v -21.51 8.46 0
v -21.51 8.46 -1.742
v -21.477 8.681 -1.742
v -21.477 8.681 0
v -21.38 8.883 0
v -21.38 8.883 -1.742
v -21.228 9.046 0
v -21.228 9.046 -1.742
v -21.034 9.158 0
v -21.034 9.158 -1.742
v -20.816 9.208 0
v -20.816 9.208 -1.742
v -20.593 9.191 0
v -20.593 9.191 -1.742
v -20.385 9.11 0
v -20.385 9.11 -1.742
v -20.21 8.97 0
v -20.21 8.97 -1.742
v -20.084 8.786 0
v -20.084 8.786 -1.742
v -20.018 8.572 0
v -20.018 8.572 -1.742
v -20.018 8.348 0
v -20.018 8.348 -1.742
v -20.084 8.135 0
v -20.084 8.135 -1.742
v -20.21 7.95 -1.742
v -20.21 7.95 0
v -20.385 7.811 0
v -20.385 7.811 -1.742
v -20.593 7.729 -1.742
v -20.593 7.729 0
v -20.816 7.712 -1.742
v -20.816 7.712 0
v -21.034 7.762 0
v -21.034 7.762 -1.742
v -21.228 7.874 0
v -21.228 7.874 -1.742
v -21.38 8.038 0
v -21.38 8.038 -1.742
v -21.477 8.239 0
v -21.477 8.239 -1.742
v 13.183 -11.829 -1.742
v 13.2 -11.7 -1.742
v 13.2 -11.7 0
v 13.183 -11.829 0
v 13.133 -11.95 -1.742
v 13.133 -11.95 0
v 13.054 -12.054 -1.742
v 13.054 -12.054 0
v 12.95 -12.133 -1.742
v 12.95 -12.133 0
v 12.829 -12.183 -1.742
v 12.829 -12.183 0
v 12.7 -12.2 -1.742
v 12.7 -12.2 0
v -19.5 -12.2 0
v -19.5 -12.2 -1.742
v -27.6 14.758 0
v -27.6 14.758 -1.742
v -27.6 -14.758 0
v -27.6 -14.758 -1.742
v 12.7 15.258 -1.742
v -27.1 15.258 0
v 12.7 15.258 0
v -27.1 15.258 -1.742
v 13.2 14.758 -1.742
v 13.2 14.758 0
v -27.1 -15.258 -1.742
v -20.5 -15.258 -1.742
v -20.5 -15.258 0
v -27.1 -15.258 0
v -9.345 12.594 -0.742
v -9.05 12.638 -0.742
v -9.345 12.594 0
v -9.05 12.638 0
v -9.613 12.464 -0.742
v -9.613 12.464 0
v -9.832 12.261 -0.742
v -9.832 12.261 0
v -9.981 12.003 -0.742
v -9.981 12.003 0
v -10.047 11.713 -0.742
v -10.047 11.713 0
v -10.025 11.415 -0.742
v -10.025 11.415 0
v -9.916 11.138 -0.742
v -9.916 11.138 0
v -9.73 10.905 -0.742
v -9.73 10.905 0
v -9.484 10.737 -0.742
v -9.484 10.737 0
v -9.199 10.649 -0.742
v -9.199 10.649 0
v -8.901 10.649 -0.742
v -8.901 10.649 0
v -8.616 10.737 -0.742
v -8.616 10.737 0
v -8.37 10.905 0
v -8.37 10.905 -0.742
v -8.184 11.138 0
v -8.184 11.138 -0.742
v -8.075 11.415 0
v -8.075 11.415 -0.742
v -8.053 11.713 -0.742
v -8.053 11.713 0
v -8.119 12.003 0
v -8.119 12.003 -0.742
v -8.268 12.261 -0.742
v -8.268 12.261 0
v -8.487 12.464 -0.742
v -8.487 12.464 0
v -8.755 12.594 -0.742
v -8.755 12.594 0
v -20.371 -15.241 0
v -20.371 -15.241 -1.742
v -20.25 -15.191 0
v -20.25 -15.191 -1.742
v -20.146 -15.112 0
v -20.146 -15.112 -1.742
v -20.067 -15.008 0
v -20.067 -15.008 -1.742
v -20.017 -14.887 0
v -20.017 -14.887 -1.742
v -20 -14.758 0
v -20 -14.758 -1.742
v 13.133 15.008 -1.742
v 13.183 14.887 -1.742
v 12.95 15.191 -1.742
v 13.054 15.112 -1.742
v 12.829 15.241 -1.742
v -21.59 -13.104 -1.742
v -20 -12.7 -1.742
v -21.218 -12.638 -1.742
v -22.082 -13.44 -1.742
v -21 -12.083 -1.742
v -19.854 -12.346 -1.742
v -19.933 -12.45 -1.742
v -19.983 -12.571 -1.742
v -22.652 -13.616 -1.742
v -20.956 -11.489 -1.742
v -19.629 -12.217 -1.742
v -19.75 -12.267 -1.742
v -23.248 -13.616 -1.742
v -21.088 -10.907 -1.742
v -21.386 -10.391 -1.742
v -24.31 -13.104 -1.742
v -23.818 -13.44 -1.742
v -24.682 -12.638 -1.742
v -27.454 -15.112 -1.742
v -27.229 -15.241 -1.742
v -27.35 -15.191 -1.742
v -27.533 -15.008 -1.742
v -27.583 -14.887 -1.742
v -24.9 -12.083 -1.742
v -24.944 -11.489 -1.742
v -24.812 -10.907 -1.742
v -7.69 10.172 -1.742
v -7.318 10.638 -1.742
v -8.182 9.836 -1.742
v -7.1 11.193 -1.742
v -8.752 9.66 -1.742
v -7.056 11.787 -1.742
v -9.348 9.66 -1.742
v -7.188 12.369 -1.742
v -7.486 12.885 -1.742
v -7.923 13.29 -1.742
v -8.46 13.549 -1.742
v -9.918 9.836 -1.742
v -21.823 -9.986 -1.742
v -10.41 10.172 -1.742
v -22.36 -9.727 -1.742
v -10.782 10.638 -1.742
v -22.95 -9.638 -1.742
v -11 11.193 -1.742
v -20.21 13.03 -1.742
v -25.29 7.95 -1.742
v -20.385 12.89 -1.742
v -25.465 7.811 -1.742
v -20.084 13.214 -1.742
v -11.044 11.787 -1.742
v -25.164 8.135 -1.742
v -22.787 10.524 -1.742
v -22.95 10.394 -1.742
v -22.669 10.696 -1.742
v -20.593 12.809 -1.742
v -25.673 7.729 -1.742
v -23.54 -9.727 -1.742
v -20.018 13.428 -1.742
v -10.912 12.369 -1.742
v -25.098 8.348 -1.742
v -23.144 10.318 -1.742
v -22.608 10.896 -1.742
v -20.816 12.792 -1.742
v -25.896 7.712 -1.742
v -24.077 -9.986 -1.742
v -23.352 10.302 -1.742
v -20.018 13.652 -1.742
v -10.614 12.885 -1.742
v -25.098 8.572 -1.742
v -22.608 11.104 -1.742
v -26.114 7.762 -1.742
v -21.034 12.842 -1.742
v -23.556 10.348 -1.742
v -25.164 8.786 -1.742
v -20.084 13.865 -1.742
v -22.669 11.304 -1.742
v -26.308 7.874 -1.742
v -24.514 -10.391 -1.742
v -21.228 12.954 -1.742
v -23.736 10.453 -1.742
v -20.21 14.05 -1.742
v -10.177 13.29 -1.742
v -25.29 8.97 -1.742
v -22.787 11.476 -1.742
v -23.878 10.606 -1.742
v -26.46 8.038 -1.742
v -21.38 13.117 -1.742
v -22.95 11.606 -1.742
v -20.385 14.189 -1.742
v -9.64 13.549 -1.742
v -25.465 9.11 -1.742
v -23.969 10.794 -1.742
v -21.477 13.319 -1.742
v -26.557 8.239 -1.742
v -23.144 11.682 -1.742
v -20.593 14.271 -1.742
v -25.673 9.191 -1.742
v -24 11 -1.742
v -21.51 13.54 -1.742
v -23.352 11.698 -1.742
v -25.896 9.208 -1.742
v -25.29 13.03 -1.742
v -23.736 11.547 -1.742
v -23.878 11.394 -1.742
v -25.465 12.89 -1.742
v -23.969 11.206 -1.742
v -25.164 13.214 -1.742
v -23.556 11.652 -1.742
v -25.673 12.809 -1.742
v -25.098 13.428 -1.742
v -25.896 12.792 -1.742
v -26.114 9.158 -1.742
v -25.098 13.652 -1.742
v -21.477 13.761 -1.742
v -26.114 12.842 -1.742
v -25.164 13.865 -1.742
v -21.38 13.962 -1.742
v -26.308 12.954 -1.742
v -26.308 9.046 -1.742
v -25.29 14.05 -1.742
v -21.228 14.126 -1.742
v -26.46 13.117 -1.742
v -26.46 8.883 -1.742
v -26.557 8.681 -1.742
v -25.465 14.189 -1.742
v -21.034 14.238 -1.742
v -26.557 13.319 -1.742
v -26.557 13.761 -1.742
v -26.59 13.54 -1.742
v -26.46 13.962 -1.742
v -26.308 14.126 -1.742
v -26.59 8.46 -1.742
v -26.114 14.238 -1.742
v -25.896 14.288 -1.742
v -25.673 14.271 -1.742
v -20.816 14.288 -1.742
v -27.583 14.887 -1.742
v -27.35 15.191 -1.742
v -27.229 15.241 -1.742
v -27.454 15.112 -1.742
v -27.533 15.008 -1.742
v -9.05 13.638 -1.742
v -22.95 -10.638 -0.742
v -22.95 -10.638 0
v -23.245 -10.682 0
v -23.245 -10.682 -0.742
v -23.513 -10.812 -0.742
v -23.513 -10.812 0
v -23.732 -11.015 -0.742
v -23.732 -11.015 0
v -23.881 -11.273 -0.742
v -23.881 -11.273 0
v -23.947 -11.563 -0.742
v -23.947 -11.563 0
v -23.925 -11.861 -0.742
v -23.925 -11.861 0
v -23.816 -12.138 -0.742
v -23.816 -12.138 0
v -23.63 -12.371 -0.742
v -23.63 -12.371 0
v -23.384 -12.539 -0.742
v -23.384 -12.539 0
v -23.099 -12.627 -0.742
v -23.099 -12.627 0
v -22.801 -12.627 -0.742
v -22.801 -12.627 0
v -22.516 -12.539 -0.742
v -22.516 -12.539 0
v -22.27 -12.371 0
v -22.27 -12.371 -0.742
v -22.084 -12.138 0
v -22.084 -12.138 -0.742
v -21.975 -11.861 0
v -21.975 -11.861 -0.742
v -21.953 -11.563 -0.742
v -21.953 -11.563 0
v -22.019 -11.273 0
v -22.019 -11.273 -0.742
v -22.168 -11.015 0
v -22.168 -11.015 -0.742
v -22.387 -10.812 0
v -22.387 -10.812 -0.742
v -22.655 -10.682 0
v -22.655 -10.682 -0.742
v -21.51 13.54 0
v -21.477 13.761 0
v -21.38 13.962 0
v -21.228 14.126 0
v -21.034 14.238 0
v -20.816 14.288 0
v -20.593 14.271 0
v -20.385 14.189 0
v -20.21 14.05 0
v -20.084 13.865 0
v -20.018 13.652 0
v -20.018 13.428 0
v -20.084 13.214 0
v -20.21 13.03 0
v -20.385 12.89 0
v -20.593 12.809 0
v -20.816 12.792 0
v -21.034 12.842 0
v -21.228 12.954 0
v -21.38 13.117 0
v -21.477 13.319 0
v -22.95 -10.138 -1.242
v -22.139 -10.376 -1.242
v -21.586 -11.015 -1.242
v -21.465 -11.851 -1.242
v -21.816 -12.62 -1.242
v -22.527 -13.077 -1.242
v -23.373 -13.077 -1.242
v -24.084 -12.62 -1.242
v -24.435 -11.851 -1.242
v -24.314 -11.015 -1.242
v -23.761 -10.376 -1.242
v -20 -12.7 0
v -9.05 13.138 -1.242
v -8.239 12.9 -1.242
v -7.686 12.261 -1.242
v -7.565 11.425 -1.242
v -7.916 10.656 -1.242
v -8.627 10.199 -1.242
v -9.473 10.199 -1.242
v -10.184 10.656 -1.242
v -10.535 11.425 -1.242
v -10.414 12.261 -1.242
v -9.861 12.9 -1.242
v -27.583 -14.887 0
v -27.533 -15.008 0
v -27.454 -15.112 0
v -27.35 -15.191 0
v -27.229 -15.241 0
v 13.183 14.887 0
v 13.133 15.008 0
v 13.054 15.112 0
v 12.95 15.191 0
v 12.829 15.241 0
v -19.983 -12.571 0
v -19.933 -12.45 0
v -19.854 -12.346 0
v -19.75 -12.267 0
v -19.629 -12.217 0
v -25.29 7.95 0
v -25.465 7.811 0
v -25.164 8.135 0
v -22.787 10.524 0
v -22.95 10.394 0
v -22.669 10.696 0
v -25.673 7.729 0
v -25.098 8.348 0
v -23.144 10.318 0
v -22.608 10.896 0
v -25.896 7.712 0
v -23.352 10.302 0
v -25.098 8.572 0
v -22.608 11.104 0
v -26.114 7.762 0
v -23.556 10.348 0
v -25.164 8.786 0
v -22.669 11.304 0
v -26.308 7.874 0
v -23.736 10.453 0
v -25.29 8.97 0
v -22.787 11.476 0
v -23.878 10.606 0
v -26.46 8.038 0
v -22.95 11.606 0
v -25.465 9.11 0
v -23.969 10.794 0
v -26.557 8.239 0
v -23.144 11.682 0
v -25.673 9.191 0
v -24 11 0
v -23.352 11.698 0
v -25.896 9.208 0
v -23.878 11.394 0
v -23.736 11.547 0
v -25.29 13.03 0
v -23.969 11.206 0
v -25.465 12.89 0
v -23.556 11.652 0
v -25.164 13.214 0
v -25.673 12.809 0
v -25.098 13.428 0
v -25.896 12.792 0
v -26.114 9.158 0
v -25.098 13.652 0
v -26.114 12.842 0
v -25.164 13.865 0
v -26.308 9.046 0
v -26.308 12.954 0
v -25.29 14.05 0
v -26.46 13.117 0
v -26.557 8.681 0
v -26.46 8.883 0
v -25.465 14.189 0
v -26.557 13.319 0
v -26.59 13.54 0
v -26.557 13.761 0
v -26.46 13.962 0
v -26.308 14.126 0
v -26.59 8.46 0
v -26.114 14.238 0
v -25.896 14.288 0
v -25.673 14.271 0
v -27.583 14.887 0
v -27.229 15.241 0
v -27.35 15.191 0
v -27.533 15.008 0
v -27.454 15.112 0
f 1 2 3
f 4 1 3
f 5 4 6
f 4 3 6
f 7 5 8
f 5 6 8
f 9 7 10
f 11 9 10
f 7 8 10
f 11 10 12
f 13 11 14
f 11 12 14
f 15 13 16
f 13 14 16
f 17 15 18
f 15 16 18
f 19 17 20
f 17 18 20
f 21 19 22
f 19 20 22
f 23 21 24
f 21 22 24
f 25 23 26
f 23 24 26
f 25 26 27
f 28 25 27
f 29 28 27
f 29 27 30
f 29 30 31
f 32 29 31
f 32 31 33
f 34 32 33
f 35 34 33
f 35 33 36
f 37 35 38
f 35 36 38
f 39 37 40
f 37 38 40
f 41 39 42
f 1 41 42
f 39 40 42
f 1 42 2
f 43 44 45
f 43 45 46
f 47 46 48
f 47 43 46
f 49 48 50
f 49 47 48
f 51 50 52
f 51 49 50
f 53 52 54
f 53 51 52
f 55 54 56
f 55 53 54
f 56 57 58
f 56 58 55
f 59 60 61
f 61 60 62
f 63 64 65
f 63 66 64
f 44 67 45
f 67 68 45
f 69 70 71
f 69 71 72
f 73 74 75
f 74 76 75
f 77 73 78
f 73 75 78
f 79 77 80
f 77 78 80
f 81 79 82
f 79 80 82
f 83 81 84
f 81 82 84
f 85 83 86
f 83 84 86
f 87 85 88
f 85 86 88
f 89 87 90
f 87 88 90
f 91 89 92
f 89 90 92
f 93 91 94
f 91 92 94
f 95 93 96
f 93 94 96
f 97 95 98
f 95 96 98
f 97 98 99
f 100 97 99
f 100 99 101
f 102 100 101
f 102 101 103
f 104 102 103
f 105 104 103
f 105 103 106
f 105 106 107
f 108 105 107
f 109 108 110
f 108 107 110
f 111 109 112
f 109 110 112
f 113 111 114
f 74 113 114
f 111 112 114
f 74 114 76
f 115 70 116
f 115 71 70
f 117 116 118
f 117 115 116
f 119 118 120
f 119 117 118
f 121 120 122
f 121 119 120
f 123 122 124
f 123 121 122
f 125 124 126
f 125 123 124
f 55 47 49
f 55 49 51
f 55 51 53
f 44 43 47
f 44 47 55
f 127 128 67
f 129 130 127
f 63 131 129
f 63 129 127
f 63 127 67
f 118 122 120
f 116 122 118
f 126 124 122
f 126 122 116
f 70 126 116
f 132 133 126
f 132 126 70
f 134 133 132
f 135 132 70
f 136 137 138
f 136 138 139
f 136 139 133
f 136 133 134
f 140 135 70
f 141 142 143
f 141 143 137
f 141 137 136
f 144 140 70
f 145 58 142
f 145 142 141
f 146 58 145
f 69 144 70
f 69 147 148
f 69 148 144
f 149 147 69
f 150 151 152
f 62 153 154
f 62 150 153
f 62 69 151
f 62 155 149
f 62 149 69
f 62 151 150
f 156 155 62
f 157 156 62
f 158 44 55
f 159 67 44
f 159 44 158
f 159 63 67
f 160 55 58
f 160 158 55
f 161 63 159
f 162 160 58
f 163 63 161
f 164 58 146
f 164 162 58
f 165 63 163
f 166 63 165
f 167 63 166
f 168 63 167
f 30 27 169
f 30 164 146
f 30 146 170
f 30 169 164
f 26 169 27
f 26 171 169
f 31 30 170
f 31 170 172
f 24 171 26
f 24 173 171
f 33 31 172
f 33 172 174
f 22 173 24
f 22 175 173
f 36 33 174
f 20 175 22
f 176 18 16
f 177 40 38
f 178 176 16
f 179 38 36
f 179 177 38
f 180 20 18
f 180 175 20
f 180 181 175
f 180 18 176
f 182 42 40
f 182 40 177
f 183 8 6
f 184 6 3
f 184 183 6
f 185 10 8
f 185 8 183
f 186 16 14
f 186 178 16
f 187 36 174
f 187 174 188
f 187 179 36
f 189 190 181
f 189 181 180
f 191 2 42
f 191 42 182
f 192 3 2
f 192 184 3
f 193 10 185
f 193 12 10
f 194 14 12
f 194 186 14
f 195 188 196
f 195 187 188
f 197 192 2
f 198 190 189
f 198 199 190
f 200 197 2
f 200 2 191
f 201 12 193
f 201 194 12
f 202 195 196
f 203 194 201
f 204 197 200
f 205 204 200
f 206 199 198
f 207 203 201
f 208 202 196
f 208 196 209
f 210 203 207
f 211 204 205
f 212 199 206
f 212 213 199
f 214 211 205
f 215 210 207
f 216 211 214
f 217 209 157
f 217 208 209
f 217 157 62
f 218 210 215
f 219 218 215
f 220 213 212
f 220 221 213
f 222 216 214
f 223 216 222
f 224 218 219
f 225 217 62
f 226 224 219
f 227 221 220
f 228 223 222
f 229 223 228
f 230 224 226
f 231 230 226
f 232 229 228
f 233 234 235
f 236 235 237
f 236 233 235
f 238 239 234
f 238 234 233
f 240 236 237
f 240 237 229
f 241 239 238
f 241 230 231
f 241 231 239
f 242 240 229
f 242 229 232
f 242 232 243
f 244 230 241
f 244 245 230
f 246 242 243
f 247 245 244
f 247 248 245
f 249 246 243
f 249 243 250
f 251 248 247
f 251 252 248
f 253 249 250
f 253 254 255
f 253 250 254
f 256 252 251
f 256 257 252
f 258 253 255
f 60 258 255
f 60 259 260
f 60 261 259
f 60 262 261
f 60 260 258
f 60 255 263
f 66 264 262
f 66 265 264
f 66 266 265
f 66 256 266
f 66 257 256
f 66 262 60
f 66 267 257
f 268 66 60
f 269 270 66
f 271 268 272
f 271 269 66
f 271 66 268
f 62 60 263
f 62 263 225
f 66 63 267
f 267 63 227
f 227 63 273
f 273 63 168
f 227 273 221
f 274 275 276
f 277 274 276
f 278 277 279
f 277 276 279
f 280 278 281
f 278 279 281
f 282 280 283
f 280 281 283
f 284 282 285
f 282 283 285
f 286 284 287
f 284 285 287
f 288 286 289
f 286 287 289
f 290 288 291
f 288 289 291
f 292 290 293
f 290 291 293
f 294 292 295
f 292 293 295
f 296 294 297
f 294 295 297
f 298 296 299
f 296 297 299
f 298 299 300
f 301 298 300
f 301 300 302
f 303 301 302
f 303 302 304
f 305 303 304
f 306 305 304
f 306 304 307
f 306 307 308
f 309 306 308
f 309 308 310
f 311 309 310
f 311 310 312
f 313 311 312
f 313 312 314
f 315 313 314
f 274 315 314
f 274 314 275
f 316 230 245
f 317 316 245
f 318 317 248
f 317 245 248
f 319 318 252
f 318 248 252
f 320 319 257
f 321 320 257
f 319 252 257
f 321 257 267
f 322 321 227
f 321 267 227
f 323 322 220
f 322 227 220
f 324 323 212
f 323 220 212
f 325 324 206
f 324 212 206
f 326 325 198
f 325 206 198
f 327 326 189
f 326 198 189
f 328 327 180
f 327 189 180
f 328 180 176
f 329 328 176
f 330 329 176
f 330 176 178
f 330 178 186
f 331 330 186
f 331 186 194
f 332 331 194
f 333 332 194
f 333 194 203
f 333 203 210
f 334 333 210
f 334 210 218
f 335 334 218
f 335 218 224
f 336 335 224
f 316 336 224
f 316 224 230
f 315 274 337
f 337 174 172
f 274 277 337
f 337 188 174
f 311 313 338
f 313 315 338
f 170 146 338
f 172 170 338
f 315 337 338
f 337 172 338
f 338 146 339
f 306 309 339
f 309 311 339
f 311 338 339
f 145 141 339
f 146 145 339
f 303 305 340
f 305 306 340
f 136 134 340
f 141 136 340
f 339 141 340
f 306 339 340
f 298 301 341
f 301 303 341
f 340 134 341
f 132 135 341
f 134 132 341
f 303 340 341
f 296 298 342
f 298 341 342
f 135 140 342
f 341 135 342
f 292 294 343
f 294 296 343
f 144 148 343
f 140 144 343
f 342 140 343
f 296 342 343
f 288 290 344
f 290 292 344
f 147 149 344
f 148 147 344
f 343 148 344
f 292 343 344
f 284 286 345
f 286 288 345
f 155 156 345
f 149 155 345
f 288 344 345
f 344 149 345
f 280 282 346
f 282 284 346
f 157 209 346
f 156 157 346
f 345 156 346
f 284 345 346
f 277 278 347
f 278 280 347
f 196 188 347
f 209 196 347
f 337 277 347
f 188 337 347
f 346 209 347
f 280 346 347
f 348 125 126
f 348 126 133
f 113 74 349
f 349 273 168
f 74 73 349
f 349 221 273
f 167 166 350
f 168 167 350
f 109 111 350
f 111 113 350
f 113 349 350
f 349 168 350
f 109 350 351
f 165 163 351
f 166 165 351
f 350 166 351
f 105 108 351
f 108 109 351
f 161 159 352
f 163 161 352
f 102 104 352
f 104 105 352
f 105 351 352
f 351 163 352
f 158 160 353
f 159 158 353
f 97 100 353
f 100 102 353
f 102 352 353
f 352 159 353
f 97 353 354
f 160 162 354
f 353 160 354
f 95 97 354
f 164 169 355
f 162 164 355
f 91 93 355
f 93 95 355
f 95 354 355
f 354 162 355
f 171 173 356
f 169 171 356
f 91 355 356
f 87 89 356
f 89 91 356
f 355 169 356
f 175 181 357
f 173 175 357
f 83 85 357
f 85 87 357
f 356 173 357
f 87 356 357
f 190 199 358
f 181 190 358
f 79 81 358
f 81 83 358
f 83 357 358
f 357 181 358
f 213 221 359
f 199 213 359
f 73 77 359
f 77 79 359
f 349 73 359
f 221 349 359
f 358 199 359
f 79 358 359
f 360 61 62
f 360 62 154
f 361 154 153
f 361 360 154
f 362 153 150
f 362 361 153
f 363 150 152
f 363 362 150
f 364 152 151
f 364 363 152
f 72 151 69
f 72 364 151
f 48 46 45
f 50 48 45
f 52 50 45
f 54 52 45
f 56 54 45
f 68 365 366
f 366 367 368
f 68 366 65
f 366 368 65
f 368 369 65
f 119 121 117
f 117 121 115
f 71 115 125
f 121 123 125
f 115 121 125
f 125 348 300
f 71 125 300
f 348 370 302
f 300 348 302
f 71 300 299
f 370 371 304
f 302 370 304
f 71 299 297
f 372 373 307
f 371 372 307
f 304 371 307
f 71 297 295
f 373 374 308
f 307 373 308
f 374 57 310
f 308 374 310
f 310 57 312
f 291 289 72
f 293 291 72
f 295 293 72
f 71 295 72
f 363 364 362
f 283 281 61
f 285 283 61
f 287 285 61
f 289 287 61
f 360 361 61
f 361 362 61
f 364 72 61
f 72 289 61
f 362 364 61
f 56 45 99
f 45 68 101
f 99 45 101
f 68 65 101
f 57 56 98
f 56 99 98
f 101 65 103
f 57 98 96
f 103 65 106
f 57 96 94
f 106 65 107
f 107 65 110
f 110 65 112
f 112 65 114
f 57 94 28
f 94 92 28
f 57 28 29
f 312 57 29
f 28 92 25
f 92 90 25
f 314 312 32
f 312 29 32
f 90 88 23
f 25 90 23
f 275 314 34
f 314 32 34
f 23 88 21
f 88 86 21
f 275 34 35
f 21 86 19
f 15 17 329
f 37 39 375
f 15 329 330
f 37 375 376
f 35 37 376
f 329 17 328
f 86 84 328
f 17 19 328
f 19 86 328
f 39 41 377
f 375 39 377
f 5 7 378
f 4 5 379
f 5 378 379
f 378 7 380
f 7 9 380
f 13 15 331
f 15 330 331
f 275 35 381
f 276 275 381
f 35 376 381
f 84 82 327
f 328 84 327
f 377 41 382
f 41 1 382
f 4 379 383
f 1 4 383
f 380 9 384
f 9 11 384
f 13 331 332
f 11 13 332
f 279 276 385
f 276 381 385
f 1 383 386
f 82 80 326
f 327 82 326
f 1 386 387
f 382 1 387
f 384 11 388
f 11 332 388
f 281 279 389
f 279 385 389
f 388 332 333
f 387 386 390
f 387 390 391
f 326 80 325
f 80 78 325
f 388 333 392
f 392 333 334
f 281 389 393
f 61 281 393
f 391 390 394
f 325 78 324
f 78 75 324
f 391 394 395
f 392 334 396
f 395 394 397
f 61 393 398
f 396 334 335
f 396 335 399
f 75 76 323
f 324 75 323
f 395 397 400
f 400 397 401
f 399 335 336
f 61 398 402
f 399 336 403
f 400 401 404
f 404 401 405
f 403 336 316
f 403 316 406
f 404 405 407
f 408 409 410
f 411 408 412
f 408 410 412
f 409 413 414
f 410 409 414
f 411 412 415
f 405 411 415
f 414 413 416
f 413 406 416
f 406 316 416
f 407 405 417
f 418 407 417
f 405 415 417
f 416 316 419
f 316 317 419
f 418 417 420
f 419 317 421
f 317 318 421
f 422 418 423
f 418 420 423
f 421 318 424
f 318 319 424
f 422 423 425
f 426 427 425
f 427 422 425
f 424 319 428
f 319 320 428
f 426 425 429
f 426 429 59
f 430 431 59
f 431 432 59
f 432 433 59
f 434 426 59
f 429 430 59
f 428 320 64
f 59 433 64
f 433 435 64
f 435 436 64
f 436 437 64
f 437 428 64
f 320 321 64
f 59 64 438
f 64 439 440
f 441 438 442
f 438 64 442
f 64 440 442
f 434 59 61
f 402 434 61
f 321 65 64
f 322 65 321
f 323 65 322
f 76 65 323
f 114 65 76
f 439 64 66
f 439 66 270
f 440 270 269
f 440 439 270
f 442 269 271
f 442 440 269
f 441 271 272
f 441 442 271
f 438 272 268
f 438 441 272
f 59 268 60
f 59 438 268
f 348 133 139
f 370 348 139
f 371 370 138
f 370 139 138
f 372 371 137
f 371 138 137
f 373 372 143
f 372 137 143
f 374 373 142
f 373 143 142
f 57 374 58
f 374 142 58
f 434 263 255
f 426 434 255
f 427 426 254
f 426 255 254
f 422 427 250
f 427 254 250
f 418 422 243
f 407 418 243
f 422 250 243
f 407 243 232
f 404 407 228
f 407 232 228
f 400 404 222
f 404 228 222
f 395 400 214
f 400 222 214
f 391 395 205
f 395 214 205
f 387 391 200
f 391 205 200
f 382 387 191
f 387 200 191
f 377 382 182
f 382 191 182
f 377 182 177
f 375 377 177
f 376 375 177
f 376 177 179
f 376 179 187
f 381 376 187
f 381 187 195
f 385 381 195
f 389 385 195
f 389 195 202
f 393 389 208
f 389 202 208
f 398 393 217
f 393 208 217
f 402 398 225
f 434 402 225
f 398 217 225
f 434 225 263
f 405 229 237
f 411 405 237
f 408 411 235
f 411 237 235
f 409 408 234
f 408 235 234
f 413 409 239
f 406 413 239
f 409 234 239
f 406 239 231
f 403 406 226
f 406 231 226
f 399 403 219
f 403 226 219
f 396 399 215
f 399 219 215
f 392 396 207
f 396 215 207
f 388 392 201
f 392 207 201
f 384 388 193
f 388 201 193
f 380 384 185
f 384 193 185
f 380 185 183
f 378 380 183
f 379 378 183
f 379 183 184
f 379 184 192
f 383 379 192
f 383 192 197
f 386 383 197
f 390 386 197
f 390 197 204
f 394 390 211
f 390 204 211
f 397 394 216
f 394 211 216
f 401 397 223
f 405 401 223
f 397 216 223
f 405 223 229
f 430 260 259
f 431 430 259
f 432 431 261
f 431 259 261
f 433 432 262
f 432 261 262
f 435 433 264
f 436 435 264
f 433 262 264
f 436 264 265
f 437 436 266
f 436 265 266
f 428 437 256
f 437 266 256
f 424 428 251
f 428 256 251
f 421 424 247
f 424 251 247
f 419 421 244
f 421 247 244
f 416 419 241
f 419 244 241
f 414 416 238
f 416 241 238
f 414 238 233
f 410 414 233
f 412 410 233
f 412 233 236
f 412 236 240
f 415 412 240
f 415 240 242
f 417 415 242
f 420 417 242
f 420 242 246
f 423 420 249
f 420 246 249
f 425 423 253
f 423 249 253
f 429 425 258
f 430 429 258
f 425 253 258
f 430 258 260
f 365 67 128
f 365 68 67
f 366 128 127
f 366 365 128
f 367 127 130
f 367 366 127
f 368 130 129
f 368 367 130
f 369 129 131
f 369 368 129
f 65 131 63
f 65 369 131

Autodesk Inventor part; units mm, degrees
ref_plane "YZ Plane" through (0, 0, 0) normal (1, 0, 0) x (0, 1, 0)
ref_plane "XZ Plane" through (0, 0, 0) normal (0, 1, 0) x (-1, 0, 0)
ref_plane "XY Plane" through (0, 0, 0) normal (0, 0, 1) x (1, 0, 0)
sketch "Boceto1" plane through (0, 0, 0) normal (0, 0, 1) x (1, 0, 0)
  line L0 (-26, 17) -> (26, 17)
  line L1 (26, 17) -> (26, -17)
  line L2 (26, -17) -> (-26, -17)
  line L3 (-26, -17) -> (-26, 17)
  line L4 (-26, 17) -> (26, -17) construction
  line L5 (26, 17) -> (-26, -17) construction
  point P0 (0, 0)
  dimension "d0" = 52
  dimension "d1" = 34
extrude "Extrusión1" add sketch "Boceto1" against normal blind 1.742
fillet "Empalme1" radius 0.5 4 edges at (26, 17, -0.871) (-26, 17, -0.871) (-26, -17, -0.871) (26, -17, -0.871)
sketch "Boceto2" plane through (0, 0, 0) normal (0, 0, 1) x (1, 0, 0)
  line L0 (25.5, 17) -> (-25.5, 17) projected
  line L1 (26, 16.5) -> (26, -16.5) projected
  line L2 (25.5, -17) -> (-25.5, -17) construction
  line L3 (23, -17) -> (-20, -17)
  line L4 (-20, -17) -> (-20, -12.2)
  line L5 (-20, -12.2) -> (23, -12.2)
  line L6 (23, -12.2) -> (23, -17)
  point P0 (0, 0)
  dimension "d13" = 3
  dimension "d14" = 4.8
  dimension "d15" = 43
extrude "Extrusión2" cut sketch "Boceto2" against normal through all
sketch "Boceto3" plane through (0, 0, -1.742) normal (0, 0, -1) x (-1, 0, 0)
  arc A0 (26, 16.5) -> (25.5, 17) centre (25.5, 16.5) ccw projected
  line L0 (26, -16.5) -> (26, 16.5) projected
  arc A1 (25.5, -17) -> (26, -16.5) centre (25.5, -16.5) ccw projected
  line L1 (25.5, 17) -> (27.6, 17)
  line L2 (27.6, 17) -> (27.6, -17)
  line L3 (27.6, -17) -> (25.5, -17)
  point P0 (0, 0)
  dimension "d10" = 1.6
extrude "Extrusión3" add sketch "Boceto3" against normal up to surface (1.742 mm away)
sketch "Boceto4" plane through (0, 0, 0) normal (0, 0, 1) x (1, 0, 0)
  line L0 (-27.6, 17) -> (25.5, 17) construction
  arc A0 (26, 16.5) -> (25.5, 17) centre (25.5, 16.5) ccw construction
  line L1 (26, 16.5) -> (26, -16.5) construction
  line L2 (25.5, -17) -> (23, -17) construction
  arc A1 (25.5, -17) -> (26, -16.5) centre (25.5, -16.5) ccw construction
  line L3 (23, -12.2) -> (23, -17) construction
  line L4 (-20, -12.2) -> (23, -12.2) construction
  line L5 (26, 17) -> (22.8, 17)
  line L6 (22.8, 17) -> (22.8, -17)
  line L7 (22.8, -17) -> (26, -17)
  line L8 (26, -17) -> (26, 17)
  point P0 (0, 0)
  dimension "d16" = 3.2
  dimension "d17" = 34
extrude "Extrusión4" cut sketch "Boceto4" against normal up to surface (1.742 mm away)
sketch "Boceto5" plane through (0, 0, 0) normal (0, 0, 1) x (1, 0, 0)
  line L0 (-27.6, 17) -> (22.8, 17) projected
  line L1 (22.8, 17) -> (13.2, 17)
  line L2 (13.2, 17) -> (13.2, -12.2)
  line L3 (13.2, -12.2) -> (22.8, -12.2)
  line L4 (22.8, -12.2) -> (22.8, 17)
  point P0 (0, 0)
  point P1 (22.8, -12.2)
  dimension "d20" = 9.6
extrude "Extrusión5" cut sketch "Boceto5" against normal up to surface (1.742 mm away)
fillet "Empalme2" radius 1 3 edges at (-27.6, -17, -0.871) (-27.6, 17, -0.871) (13.2, 17, -0.871)
sketch "Boceto8" plane through (0, 0, -1.742) normal (0, 0, -1) x (-1, 0, 0)
  line L0 (20, -17) -> (26.6, -17) projected
  line L1 (20, -12.2) -> (20, -17) projected
  point P0 (0, 0)
  point P1 (22.95, -11.638)
  dimension "d54" = 5.362
  dimension "d55" = 2.95
hole "Agujero3" at (-22.95, -11.638, -1.742) direction (0, 0, 1) diameter 2 end through all countersink diameter 4 countersink angle 90
sketch "Boceto9" plane through (0, 0, -1.742) normal (0, 0, -1) x (-1, 0, 0)
  line L0 (-13.2, 16) -> (-13.2, -12.2) projected
  line L1 (26.6, 17) -> (-12.2, 17) projected
  point P0 (0, 0)
  point P1 (9.05, 11.638)
  dimension "d52" = 22.25
  dimension "d53" = 5.362
hole "Agujero4" at (-9.05, 11.638, -1.742) direction (0, 0, 1) diameter 2 end through all countersink diameter 4 countersink angle 90
sketch "Boceto10" plane through (0, 0, -1.742) normal (0, 0, -1) x (-1, 0, 0)
  line L0 (20.7601, 13.5399) -> (25.8399, 13.5399) construction
  line L1 (25.8399, 13.5399) -> (25.8399, 8.4601) construction
  line L2 (25.8399, 8.4601) -> (20.7601, 8.4601) construction
  line L3 (20.7601, 8.4601) -> (20.7601, 13.5399) construction
  line L4 (20.7601, 13.5399) -> (25.8399, 8.4601) construction
  line L5 (26.6, 17) -> (-12.2, 17) construction
  line L6 (27.6, -16) -> (27.6, 16) construction
  circle A0 centre (20.7601, 13.5399) radius 0.75
  circle A1 centre (25.8399, 13.5399) radius 0.75
  circle A2 centre (20.7601, 8.4601) radius 0.75
  circle A3 centre (25.8399, 8.4601) radius 0.75
  circle A4 centre (23.3, 11) radius 0.7
  point P0 (0, 0)
  dimension "d56" = 7.184
  dimension "d57" = 45
  dimension "d58" = 6
  dimension "d59" = 4.3
  dimension "d60" = 1.5
  dimension "d61" = 1.5
  dimension "d62" = 1.5
  dimension "d63" = 1.5
  dimension "d64" = 1.4
extrude "Extrusión6" cut sketch "Boceto10" against normal up to surface (1.742 mm away)
fillet "Empalme3" radius 0.5 1 edges at (13.2, -12.2, -0.871)
fillet "Empalme4" radius 0.5 2 edges at (-20, -17, -0.871) (-20, -12.2, -0.871)
sketch "Boceto11" plane through (0, 0, -1.742) normal (0, 0, -1) x (-1, 0, 0)
  line L0 (-13.2, 17) -> (27.6, 17)
  line L1 (27.6, 17) -> (27.6, 15.258)
  line L2 (27.6, 15.258) -> (-13.2, 15.258)
  line L3 (-13.2, 15.258) -> (-13.2, 17)
  line L4 (-13.2, 16) -> (-13.2, -11.7) projected
  line L5 (27.6, -16) -> (27.6, 16) projected
  line L6 (20, -15.258) -> (27.6, -15.258)
  line L7 (27.6, -15.258) -> (27.6, -17)
  line L8 (27.6, -17) -> (20, -17)
  line L9 (20, -17) -> (20, -15.258)
  line L10 (20, -12.7) -> (20, -16.5) projected
  line L11 (20.5, -17) -> (26.6, -17) projected
  point P0 (0, 0)
  point P1 (26.6, 17)
  dimension "d69" = 1.742
  dimension "d70" = 1.742
extrude "Extrusión7" cut sketch "Boceto11" against normal up to surface (1.742 mm away)
fillet "Empalme5" radius 0.5 4 edges at (13.2, 15.258, -0.871) (-27.6, 15.258, -0.871) (-20, -15.258, -0.871) (-27.6, -15.258, -0.871)
properties part number "hw_DAA - PCB MicroSD" material "PCB"
